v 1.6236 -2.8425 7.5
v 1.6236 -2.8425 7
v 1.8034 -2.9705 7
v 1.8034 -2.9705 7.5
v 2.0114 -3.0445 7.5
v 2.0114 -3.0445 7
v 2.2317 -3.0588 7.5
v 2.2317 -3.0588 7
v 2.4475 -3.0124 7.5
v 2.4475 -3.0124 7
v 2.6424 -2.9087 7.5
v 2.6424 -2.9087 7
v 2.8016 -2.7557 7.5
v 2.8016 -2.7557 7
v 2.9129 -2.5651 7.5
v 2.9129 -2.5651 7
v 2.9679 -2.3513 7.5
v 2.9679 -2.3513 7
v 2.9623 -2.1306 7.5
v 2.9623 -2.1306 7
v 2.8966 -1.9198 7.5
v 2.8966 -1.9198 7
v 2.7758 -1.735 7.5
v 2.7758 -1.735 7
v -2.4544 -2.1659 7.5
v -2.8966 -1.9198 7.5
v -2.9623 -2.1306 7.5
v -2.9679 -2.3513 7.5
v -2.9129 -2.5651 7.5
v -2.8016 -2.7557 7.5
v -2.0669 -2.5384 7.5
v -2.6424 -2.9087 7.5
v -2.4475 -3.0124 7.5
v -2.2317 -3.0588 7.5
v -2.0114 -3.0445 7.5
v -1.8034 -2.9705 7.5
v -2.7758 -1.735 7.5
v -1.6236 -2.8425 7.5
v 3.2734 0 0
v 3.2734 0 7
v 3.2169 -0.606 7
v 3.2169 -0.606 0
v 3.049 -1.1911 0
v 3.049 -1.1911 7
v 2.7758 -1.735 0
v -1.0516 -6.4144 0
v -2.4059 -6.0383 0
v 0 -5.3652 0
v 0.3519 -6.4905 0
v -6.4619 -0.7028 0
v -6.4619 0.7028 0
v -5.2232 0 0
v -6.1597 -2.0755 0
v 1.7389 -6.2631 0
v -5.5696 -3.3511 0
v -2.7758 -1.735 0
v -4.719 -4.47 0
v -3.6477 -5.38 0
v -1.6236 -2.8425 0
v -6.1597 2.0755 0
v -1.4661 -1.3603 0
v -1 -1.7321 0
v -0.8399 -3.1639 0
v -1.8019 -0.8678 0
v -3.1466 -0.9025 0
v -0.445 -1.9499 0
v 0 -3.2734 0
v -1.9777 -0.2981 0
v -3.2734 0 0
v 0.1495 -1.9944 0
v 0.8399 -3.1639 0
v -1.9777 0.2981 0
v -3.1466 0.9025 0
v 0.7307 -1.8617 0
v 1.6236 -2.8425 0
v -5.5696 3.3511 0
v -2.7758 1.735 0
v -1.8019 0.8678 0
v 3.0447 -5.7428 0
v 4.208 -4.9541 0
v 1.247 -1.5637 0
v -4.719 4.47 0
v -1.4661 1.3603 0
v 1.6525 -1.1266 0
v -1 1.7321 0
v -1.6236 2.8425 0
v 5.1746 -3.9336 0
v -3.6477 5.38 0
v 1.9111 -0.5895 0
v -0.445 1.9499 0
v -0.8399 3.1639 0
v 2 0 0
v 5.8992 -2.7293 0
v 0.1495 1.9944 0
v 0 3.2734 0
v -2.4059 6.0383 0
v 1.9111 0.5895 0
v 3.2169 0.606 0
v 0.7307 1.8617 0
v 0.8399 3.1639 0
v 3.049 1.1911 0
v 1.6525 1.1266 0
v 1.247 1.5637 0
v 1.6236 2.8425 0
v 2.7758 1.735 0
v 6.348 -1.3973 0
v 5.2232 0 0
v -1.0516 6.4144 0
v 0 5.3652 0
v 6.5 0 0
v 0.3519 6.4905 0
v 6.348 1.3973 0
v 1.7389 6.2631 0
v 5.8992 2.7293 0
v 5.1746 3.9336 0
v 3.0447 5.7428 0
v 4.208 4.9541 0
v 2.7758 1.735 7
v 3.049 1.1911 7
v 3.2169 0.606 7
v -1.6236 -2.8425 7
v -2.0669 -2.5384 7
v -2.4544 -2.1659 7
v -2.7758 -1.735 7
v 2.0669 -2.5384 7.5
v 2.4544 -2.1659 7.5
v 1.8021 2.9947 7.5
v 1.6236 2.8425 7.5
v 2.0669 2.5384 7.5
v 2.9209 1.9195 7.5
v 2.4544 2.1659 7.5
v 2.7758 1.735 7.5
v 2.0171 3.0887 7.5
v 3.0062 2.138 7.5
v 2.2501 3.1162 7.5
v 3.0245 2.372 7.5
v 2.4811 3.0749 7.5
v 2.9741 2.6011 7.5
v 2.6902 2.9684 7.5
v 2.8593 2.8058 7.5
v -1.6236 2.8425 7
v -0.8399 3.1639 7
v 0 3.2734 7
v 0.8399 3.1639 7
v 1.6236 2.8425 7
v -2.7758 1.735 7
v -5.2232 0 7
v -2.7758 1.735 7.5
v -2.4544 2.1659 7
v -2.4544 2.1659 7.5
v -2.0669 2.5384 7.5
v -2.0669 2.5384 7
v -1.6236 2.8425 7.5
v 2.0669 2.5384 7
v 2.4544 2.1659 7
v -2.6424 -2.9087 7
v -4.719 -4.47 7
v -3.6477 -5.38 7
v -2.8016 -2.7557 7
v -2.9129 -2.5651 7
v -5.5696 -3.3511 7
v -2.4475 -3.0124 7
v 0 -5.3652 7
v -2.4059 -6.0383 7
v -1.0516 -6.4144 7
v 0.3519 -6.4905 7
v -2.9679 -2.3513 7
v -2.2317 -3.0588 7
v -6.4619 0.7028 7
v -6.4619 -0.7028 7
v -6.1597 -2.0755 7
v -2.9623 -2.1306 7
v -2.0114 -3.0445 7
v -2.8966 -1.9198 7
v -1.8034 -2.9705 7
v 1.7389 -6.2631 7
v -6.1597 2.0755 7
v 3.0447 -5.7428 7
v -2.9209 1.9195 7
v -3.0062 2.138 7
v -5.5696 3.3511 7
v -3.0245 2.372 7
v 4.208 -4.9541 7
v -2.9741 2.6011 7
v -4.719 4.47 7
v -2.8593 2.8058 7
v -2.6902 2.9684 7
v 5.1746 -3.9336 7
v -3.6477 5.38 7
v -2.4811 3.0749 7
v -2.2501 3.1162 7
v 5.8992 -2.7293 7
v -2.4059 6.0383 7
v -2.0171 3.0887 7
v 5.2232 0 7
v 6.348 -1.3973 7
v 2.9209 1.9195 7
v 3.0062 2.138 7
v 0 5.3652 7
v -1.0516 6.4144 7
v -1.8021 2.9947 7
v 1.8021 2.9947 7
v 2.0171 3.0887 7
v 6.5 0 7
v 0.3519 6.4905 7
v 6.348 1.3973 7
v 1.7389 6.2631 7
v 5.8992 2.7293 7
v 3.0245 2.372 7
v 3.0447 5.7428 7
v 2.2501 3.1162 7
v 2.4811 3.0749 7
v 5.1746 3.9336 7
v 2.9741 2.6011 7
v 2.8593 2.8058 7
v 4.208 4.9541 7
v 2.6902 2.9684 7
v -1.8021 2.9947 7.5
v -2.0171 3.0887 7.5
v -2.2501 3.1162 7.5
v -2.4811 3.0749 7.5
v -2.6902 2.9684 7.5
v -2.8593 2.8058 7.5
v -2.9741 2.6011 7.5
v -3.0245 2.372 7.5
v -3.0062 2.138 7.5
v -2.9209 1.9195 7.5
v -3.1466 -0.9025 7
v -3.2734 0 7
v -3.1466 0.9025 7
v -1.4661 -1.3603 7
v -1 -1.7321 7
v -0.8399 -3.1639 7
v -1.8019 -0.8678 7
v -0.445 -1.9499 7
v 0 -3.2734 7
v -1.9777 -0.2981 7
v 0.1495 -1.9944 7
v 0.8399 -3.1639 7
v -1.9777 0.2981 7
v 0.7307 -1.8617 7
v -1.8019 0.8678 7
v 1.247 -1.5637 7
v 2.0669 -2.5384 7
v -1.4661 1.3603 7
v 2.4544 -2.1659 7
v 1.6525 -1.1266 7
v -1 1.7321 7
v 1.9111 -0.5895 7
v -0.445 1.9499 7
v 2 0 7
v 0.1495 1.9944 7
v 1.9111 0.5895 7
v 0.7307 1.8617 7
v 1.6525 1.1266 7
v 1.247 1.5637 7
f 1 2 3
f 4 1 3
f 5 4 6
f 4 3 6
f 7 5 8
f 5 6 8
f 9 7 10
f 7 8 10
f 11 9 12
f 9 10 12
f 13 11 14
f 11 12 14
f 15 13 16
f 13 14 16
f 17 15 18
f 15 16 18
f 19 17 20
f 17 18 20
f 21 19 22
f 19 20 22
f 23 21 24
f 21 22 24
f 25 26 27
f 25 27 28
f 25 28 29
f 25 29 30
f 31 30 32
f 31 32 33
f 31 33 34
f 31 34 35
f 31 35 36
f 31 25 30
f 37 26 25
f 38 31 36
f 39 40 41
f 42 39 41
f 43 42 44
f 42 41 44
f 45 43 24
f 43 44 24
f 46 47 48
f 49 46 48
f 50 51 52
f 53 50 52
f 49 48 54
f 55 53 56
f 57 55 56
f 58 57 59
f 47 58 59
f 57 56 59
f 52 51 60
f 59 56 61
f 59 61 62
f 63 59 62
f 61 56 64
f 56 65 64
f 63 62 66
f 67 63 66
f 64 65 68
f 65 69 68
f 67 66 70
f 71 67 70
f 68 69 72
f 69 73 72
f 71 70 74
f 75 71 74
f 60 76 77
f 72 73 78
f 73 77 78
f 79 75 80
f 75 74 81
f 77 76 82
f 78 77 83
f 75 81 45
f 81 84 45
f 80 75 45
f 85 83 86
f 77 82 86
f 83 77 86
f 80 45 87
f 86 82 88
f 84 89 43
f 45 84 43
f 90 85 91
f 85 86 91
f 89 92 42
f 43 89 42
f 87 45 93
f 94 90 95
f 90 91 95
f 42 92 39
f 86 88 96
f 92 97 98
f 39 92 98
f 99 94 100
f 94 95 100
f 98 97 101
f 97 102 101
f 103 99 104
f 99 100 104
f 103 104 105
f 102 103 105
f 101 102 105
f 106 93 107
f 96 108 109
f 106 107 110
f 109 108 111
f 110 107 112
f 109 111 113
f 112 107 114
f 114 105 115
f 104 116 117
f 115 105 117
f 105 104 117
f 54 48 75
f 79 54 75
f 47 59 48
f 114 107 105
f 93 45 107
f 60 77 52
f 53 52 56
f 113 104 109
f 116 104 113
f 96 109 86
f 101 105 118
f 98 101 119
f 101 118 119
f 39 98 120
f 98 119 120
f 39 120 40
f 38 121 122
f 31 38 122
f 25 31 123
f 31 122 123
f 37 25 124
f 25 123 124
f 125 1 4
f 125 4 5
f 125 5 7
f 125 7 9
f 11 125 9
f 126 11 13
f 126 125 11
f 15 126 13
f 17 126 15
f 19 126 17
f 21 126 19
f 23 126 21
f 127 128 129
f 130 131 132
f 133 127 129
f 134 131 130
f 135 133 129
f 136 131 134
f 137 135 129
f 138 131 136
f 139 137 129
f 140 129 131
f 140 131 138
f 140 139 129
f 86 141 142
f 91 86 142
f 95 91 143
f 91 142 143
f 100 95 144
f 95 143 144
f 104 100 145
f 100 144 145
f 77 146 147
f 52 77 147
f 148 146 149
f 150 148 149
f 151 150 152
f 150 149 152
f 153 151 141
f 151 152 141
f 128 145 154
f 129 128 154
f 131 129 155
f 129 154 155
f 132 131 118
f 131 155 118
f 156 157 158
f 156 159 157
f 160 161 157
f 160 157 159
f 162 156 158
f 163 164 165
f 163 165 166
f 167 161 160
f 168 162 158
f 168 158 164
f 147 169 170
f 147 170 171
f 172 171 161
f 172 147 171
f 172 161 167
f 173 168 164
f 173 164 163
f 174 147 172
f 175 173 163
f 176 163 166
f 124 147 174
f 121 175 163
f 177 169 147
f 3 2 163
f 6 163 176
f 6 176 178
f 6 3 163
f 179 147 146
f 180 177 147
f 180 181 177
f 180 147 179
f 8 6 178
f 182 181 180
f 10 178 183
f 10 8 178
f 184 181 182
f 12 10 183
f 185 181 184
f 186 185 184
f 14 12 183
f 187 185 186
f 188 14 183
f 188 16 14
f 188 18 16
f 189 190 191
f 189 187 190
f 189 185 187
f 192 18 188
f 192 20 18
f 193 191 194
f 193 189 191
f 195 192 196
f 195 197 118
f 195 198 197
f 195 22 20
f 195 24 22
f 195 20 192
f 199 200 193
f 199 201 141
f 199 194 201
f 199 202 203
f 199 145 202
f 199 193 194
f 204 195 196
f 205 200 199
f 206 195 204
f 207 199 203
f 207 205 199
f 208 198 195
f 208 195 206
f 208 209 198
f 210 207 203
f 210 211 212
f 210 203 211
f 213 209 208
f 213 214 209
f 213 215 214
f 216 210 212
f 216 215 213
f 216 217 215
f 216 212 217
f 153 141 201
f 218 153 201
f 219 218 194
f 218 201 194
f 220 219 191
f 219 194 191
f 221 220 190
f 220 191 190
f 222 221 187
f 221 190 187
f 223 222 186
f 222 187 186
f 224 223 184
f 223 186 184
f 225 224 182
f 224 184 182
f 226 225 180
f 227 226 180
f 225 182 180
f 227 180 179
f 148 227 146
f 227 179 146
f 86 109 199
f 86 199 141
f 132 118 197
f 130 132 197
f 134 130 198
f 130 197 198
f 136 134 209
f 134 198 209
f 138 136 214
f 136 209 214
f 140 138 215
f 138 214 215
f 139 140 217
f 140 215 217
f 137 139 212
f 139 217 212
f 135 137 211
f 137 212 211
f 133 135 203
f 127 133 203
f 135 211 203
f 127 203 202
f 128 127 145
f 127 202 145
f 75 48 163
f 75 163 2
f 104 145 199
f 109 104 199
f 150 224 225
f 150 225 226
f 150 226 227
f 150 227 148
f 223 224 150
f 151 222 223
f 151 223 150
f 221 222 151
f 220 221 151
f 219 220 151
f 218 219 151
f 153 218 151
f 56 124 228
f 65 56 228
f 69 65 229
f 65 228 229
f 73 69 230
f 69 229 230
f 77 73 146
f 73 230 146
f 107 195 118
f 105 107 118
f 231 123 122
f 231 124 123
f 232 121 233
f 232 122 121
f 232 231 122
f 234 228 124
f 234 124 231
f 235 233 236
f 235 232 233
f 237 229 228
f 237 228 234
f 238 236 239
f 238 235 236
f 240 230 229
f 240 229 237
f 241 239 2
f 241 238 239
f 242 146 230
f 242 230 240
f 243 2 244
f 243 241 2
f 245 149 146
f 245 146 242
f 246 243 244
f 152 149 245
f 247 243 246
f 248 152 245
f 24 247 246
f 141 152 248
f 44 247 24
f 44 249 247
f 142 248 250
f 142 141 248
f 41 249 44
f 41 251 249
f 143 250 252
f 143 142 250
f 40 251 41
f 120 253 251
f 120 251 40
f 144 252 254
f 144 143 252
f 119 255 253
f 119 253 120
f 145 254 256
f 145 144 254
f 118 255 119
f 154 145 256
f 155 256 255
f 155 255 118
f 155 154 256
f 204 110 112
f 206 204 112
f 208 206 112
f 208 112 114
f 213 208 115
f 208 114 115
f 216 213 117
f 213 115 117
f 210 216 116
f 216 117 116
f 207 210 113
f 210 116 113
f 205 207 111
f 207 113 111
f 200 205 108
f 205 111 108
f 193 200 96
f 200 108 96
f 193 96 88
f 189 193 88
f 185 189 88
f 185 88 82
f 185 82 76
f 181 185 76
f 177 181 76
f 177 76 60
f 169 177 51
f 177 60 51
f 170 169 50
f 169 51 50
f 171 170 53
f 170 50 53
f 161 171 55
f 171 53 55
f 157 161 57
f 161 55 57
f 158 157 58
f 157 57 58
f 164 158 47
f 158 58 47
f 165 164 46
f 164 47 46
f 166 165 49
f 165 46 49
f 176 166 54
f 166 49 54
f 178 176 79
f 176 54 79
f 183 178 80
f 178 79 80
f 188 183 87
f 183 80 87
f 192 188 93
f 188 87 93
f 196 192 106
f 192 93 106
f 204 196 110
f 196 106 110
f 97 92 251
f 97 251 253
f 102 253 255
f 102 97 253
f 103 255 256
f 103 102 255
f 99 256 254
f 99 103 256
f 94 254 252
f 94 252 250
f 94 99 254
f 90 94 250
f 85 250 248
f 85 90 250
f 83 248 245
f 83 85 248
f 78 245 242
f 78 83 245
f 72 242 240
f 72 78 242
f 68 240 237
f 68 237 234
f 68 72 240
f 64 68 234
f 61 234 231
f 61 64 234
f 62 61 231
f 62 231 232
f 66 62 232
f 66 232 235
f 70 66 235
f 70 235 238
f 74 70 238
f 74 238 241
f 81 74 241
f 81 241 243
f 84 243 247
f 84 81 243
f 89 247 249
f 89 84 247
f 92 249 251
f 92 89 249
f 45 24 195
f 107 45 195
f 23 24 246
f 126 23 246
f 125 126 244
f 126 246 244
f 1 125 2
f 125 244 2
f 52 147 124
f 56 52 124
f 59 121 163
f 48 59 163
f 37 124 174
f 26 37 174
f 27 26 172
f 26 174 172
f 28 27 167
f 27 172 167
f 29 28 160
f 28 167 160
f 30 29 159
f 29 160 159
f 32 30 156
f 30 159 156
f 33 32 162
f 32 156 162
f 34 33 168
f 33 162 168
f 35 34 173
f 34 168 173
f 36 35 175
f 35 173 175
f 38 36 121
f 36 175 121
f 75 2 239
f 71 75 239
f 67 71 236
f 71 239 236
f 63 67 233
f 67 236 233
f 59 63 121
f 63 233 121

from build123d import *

# Parameters (mm, degrees)
F0_R     = 6.5
F0_R_2   = 2
F1_DEPTH = 7
F3_DEPTH = 25
F4_DEPTH = 0.5


with BuildPart() as f1:
    # F0 (on Top) → F1 (new body)
    with BuildSketch(Plane.XY):
        Circle(F0_R)
        Circle(F0_R_2, mode=Mode.SUBTRACT)
    extrude(amount=F1_DEPTH)

    # F2 (on face) → F3 (cut)
    with BuildSketch(Plane.XY.offset(7)):
        with BuildLine():
            ThreePointArc((-2.775807, -1.735036), (-3.273446, 0), (-2.775807, 1.735036))
            Line((-2.775807, 1.735036), (-5.223183, 0))
            Line((-5.223183, 0), (-2.775807, -1.735036))
        make_face()
        with BuildLine():
            Line((0, -5.365163), (1.623553, -2.842451))
            ThreePointArc((1.623553, -2.842451), (0, -3.273446), (-1.623553, -2.842451))
            Line((-1.623553, -2.842451), (0, -5.365163))
        make_face()
        with BuildLine():
            ThreePointArc((2.775807, 1.735036), (3.146578, 0.902496), (3.273446, 0))
            ThreePointArc((3.273446, 0), (3.146578, -0.902496), (2.775807, -1.735036))
            Line((2.775807, -1.735036), (5.223183, 0))
            Line((5.223183, 0), (2.775807, 1.735036))
        make_face()
        with BuildLine():
            ThreePointArc((-1.623553, 2.842451), (0, 3.273446), (1.623553, 2.842451))
            Line((1.623553, 2.842451), (0, 5.365163))
            Line((0, 5.365163), (-1.623553, 2.842451))
        make_face()
    extrude(amount=-F3_DEPTH, mode=Mode.SUBTRACT)

    # F2 (on face) → F4 (join)
    with BuildSketch(Plane.XY.offset(7)):
        with BuildLine():
            ThreePointArc((1.623553, 2.842451), (2.2683, 2.360142), (2.775807, 1.735036))
            ThreePointArc((2.775807, 1.735036), (2.780742, 2.893332), (1.623553, 2.842451))
        make_face()
        with BuildLine():
            ThreePointArc((-2.775807, 1.735036), (-2.2683, 2.360142), (-1.623553, 2.842451))
            ThreePointArc((-1.623553, 2.842451), (-2.780742, 2.893332), (-2.775807, 1.735036))
        make_face()
        with BuildLine():
            ThreePointArc((-2.775807, -1.735036), (-2.727321, -2.837748), (-1.623553, -2.842451))
            ThreePointArc((-1.623553, -2.842451), (-2.2683, -2.360142), (-2.775807, -1.735036))
        make_face()
        with BuildLine():
            ThreePointArc((1.623553, -2.842451), (2.727321, -2.837748), (2.775807, -1.735036))
            ThreePointArc((2.775807, -1.735036), (2.2683, -2.360142), (1.623553, -2.842451))
        make_face()
    extrude(amount=F4_DEPTH)


solid = f1.part
